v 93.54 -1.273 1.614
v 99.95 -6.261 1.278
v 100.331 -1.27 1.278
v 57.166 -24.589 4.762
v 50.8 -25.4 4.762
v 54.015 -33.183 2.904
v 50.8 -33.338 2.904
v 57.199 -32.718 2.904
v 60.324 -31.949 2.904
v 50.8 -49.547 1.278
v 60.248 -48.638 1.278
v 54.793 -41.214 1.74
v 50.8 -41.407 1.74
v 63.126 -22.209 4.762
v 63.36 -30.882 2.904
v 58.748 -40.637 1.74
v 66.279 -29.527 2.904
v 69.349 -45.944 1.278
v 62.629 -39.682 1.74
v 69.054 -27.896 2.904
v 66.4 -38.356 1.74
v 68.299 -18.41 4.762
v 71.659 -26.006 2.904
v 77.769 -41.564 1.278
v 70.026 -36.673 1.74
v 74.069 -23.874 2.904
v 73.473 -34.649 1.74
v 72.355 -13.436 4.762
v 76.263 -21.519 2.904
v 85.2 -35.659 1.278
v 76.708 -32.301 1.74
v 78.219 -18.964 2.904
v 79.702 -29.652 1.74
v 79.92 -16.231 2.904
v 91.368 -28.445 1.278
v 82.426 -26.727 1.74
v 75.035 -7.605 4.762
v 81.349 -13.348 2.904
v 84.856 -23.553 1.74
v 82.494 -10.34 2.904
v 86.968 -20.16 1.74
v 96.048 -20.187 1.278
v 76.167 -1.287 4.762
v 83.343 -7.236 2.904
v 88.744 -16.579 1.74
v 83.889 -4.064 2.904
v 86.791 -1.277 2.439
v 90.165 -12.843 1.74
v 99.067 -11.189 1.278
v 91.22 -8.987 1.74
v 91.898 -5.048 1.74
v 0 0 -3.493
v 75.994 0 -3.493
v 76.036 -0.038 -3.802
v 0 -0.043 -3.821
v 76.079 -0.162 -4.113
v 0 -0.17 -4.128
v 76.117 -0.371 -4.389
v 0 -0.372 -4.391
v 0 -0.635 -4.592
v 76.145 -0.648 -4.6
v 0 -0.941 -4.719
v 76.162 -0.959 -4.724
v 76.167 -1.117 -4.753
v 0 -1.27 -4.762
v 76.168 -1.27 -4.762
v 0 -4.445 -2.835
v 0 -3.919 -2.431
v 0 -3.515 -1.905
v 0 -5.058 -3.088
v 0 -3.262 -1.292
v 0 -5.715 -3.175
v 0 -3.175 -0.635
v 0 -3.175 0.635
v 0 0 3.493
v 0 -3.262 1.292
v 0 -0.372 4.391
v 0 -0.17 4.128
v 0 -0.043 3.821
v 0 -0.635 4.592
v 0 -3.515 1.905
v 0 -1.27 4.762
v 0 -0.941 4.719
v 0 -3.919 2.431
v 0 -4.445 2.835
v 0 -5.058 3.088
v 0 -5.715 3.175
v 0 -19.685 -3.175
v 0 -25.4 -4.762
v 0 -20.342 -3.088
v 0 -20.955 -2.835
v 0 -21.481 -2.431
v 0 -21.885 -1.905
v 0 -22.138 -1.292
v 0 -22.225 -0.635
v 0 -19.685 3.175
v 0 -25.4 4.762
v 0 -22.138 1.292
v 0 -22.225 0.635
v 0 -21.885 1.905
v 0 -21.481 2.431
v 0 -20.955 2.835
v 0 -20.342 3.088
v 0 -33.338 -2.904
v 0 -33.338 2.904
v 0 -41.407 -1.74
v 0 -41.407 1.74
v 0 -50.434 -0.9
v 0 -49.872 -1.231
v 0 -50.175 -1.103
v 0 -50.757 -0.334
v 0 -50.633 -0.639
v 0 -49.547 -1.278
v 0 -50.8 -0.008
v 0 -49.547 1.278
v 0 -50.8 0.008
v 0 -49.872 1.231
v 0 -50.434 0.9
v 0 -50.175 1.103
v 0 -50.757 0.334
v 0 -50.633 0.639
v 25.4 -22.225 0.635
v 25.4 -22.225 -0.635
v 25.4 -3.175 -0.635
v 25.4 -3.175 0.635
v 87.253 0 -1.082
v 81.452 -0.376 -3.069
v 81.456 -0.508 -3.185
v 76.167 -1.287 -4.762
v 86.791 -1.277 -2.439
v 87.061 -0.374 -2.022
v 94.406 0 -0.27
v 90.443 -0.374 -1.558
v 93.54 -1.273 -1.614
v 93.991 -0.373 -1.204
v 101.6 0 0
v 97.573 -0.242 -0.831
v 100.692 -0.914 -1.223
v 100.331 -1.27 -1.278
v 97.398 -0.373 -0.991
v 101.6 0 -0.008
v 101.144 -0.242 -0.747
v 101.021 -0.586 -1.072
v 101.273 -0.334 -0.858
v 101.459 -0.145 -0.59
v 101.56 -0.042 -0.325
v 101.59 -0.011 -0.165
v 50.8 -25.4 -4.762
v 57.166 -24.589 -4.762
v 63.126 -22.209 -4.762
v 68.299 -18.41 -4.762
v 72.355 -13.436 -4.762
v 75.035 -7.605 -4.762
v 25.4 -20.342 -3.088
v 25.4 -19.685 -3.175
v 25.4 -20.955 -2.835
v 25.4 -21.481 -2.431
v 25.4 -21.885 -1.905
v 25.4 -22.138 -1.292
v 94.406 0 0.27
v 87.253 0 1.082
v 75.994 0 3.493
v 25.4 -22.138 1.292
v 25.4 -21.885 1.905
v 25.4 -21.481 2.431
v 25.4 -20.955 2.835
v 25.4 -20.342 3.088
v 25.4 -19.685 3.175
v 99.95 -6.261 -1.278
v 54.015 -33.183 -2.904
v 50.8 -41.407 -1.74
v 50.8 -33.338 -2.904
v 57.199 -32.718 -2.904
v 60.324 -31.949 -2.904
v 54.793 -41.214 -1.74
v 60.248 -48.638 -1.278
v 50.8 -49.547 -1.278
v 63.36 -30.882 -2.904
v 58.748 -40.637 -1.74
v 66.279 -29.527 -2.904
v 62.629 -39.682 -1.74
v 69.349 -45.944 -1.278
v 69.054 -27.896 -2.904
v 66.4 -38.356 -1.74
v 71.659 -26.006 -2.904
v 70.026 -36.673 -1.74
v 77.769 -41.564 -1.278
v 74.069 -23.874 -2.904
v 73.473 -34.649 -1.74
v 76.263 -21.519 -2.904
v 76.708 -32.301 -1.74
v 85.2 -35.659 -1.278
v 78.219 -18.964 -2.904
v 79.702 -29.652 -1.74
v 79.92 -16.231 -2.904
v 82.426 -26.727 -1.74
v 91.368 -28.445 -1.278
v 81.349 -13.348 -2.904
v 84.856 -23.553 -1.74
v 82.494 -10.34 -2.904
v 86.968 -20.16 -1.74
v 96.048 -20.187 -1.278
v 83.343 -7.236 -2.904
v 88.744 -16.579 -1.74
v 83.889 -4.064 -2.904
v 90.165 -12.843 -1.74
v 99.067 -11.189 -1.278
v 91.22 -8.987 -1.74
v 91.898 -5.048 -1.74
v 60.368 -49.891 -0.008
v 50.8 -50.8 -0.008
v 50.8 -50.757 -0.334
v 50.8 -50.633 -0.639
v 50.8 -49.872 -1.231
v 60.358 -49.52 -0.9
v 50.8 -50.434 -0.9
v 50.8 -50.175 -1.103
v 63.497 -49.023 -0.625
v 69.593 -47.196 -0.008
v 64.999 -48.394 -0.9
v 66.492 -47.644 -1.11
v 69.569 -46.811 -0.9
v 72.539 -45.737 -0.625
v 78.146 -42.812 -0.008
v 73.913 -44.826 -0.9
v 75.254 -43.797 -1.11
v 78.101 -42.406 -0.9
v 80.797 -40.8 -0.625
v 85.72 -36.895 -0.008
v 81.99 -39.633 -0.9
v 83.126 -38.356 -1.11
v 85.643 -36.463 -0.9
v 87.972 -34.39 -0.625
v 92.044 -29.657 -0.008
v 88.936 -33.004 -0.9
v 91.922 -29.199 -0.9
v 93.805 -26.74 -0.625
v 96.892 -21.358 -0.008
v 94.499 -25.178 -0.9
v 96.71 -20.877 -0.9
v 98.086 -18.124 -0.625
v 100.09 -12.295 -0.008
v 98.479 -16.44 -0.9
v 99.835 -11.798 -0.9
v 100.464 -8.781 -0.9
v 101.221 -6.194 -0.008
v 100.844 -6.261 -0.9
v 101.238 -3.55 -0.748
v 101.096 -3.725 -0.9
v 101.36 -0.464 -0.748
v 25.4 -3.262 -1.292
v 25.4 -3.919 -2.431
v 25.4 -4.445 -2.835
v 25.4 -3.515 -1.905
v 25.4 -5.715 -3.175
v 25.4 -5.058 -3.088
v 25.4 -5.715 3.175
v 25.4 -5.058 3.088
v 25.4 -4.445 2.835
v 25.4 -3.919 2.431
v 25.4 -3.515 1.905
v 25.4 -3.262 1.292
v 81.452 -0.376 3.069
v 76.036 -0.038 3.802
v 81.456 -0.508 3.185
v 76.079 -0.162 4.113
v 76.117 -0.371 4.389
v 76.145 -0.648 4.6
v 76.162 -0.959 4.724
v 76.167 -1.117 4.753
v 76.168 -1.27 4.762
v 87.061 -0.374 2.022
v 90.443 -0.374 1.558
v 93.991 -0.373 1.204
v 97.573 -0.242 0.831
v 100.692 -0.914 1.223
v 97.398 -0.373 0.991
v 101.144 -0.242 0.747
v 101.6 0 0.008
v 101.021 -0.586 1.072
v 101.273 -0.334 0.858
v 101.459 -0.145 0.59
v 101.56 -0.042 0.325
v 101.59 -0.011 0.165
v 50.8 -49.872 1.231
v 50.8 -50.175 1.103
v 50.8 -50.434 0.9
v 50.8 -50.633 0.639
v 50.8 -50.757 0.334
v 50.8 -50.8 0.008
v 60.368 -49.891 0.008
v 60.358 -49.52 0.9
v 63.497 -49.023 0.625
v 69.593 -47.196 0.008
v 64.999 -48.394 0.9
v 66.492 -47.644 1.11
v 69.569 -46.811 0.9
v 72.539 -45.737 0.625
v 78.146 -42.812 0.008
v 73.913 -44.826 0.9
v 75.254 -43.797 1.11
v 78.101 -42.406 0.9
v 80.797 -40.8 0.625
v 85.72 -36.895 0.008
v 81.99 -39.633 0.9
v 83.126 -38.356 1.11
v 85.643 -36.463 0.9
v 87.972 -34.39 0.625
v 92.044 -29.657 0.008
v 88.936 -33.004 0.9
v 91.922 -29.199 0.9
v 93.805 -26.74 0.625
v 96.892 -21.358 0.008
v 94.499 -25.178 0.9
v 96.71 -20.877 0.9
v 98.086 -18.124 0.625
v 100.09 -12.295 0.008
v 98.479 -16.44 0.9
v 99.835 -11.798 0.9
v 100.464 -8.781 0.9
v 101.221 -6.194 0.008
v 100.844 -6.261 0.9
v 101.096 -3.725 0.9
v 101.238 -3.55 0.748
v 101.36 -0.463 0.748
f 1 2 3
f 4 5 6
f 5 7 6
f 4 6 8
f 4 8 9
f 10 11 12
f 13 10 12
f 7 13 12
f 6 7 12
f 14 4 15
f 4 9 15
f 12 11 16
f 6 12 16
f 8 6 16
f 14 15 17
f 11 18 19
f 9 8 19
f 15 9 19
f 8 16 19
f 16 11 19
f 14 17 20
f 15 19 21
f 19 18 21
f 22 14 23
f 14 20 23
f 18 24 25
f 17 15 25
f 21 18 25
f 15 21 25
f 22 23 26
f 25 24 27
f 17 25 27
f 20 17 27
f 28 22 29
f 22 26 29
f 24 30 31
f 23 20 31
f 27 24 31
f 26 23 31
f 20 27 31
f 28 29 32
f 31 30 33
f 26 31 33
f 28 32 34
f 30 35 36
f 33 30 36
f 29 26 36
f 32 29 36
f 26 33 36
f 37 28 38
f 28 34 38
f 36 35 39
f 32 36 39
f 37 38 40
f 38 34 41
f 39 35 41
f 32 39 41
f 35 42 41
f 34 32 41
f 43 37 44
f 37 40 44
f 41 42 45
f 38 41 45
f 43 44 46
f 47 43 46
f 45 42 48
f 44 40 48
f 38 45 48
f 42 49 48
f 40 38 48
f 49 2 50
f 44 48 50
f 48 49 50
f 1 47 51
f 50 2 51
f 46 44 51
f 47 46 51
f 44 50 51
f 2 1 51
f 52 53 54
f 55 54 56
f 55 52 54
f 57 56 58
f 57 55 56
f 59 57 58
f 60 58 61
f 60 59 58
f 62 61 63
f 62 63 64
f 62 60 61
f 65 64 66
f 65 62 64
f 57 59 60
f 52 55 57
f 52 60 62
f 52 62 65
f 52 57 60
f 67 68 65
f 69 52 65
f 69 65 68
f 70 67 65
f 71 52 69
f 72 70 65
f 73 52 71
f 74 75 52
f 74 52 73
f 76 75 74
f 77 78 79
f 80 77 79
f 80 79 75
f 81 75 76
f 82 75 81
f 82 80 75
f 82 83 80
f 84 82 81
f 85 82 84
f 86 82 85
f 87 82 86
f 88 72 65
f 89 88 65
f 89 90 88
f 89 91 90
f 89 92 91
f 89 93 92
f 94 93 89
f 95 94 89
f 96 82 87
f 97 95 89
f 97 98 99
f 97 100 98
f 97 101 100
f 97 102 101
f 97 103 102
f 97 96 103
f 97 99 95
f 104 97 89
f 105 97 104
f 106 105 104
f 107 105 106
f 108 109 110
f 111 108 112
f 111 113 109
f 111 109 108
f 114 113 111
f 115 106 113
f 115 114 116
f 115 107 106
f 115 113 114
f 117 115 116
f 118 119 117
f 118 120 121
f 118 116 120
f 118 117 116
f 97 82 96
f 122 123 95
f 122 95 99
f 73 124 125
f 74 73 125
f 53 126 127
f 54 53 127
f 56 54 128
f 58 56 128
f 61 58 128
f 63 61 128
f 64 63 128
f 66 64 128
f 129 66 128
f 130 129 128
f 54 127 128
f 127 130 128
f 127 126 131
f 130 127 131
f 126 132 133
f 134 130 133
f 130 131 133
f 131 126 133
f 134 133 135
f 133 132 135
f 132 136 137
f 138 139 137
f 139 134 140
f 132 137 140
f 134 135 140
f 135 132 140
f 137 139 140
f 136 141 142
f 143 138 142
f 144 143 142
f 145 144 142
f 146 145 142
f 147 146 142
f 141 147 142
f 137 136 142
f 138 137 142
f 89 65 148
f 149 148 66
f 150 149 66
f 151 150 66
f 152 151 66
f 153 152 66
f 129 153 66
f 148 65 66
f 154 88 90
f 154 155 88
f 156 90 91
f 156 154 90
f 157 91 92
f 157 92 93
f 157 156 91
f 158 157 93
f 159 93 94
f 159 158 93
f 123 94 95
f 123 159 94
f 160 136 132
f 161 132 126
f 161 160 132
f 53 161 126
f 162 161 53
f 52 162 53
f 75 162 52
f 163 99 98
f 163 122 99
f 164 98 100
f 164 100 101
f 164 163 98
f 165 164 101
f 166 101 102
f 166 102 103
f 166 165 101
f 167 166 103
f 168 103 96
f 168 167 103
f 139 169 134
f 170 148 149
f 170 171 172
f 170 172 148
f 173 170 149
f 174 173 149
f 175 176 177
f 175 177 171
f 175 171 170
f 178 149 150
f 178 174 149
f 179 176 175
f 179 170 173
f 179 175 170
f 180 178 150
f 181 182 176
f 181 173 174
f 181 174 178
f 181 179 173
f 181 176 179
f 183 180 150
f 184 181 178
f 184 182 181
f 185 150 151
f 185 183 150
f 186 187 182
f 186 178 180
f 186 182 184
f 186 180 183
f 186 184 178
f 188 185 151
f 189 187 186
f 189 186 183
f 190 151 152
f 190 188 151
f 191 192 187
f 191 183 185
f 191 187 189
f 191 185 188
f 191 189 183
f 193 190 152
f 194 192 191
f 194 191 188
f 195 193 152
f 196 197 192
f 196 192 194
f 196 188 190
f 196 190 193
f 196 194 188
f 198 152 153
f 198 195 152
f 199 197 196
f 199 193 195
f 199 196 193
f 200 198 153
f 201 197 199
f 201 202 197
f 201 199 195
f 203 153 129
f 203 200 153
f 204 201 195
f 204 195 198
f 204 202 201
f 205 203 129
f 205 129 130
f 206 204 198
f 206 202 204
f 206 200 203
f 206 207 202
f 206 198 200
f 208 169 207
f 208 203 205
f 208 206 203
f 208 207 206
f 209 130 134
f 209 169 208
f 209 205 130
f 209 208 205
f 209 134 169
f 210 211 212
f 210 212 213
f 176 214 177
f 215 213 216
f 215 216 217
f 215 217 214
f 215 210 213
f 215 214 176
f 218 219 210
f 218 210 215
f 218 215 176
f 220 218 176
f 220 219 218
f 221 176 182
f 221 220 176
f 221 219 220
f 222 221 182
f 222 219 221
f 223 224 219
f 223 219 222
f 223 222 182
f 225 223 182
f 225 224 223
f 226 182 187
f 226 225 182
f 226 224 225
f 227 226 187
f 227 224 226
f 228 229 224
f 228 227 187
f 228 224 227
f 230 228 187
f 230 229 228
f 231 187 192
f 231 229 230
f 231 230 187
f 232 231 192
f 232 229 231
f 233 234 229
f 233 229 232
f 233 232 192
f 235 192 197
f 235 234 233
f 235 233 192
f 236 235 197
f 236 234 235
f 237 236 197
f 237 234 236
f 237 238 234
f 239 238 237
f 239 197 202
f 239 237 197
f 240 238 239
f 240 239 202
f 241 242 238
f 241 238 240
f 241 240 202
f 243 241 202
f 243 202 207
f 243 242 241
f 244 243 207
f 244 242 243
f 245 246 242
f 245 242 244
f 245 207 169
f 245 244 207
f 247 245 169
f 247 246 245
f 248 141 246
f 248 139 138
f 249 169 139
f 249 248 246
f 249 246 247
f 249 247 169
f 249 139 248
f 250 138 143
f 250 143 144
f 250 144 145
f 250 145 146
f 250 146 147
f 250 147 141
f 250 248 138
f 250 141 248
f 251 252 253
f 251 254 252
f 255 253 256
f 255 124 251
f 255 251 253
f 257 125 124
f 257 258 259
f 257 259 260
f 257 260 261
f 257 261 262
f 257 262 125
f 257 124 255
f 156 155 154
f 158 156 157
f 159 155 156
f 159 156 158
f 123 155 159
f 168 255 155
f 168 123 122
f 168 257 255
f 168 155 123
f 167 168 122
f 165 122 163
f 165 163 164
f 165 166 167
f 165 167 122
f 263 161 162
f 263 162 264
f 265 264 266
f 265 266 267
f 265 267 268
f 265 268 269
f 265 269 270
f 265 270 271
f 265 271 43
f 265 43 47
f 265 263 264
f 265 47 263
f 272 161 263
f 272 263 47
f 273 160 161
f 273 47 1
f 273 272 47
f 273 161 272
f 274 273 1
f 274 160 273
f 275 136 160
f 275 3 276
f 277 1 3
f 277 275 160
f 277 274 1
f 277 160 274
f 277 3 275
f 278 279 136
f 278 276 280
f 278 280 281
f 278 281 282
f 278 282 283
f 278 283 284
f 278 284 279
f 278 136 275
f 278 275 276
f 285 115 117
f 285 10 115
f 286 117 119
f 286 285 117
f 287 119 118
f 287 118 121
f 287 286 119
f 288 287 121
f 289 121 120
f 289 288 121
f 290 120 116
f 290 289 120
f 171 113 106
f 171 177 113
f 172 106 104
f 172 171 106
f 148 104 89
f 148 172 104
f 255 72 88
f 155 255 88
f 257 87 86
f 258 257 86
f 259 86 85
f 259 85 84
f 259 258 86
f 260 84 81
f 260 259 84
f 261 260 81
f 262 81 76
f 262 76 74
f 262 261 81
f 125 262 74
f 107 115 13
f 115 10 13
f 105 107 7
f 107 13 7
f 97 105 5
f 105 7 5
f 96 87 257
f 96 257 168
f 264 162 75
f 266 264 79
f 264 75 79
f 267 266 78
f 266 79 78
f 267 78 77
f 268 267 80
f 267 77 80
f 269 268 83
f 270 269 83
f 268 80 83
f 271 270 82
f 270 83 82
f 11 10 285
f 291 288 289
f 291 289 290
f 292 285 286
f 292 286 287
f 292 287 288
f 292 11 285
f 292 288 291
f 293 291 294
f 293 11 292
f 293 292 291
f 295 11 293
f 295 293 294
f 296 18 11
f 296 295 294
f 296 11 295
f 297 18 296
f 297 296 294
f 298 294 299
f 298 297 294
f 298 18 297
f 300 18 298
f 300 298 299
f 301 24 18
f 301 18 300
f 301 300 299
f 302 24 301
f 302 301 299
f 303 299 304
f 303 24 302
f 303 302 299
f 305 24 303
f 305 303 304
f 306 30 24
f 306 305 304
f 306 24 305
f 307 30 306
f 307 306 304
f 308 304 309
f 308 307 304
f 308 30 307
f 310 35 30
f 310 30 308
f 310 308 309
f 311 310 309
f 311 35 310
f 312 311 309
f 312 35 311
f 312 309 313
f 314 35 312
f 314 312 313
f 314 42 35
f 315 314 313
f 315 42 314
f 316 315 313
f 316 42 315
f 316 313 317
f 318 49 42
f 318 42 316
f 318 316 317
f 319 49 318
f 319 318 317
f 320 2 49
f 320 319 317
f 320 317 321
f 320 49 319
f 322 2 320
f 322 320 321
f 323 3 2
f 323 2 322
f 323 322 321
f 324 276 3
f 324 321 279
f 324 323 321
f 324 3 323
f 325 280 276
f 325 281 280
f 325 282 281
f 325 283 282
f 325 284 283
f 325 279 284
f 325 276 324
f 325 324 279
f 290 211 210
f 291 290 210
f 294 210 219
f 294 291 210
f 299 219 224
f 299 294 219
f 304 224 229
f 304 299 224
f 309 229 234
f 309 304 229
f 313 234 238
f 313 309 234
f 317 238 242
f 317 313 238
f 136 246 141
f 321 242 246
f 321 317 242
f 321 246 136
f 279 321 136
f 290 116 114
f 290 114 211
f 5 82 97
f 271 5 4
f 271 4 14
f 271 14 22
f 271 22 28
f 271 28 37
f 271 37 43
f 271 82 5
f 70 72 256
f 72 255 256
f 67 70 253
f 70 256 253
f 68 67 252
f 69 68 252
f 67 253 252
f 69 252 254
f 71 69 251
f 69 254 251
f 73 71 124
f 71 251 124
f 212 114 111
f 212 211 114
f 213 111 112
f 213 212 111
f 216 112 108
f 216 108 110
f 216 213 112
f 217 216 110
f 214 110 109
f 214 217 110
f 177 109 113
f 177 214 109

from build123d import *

# Parameters (mm, degrees)
F1_DEPTH = 4.7625
F2_W     = 19.05
F2_H     = 6.35
F3_DEPTH = 25.4
F4_R     = 2.54
F9_R     = 1.26999


# Not quite as in the source:
# - a fillet or chamfer is up to 0.001 mm smaller than in the source, because OpenCascade refuses the exact size


with BuildPart() as f1:
    # F0 (on Top) → F1 (new body, symmetric)
    with BuildSketch(Plane.XY):
        with BuildLine():
            Line((101.6, 0), (0, 0))
            Line((0, 0), (0, -50.8))
            Line((0, -50.8), (50.8, -50.8))
            ThreePointArc((50.8, -50.8), (86.7210244843, -35.9210244843), (101.6, 0))
        make_face()
    extrude(amount=F1_DEPTH, both=True)

    # F2 (on face) → F3 (cut)
    with BuildSketch(Plane(origin=(0, 0, 0), x_dir=(0, -1, 0), z_dir=(-1, 0, 0))):
        with Locations((12.7, 0)):
            Rectangle(F2_W, F2_H)
    extrude(amount=-F3_DEPTH, mode=Mode.SUBTRACT)

    # F4
    f4_edges = [f1.edges().sort_by_distance(p)[0] for p in [
        (12.7, -3.175, 3.175),
        (12.7, -22.225, 3.175),
        (12.7, -3.175, -3.175),
        (12.7, -22.225, -3.175),
    ]]
    fillet(f4_edges, radius=F4_R)


with BuildPart() as f6:
    # F6: sweep along a path in F6_path
    with BuildLine(Plane(origin=(50.8, -50.8, 4.7625), x_dir=(0, 1, 0), z_dir=(0, 0, 1))) as f6_path:
        Line((0, 50.8), (0, 0))
        ThreePointArc((0, 0), (14.8789755157, -35.9210244843), (50.8, -50.8))
    # F5 (on face) → F6 (sweep)
    with BuildSketch(Plane(origin=(0, 0, 0), x_dir=(0, -1, 0), z_dir=(-1, 0, 0))):
        with BuildLine():
            Line((50.8, 4.7625), (25.4, 4.7625))
            ThreePointArc((25.4, 4.7625), (37.9805074569, 2.1472133229), (50.8, 1.27))
            Line((50.8, 1.27), (50.8, 4.7625))
        make_face()
    sweep(path=f6_path.line)


with BuildPart() as f7_1:
    # F7: instance of F6
    add(f6.part.mirror(Plane.XY))


with BuildPart() as f1_1:
    add(f1.part)

    # F8: cut F6, F7_1
    add(f6.part, mode=Mode.SUBTRACT)
    add(f7_1.part, mode=Mode.SUBTRACT)

    # F9 (radius 1.27 in the source; OpenCascade refuses exactly that, so slightly less here)
    f9_edges = [f1_1.edges().sort_by_distance(p)[0] for p in [
        (38.1, 0, 4.7625),
        (38.1, 0, -4.7625),
        (88.780507, 0, 2.147213),
        (88.780507, 0, -2.147213),
        (25.4, -50.8, 1.27),
        (25.4, -50.8, -1.27),
        (86.721024, -35.921024, 1.27),
        (86.721024, -35.921024, -1.27),
    ]]
    fillet(f9_edges, radius=F9_R)


solid = f1_1.part
